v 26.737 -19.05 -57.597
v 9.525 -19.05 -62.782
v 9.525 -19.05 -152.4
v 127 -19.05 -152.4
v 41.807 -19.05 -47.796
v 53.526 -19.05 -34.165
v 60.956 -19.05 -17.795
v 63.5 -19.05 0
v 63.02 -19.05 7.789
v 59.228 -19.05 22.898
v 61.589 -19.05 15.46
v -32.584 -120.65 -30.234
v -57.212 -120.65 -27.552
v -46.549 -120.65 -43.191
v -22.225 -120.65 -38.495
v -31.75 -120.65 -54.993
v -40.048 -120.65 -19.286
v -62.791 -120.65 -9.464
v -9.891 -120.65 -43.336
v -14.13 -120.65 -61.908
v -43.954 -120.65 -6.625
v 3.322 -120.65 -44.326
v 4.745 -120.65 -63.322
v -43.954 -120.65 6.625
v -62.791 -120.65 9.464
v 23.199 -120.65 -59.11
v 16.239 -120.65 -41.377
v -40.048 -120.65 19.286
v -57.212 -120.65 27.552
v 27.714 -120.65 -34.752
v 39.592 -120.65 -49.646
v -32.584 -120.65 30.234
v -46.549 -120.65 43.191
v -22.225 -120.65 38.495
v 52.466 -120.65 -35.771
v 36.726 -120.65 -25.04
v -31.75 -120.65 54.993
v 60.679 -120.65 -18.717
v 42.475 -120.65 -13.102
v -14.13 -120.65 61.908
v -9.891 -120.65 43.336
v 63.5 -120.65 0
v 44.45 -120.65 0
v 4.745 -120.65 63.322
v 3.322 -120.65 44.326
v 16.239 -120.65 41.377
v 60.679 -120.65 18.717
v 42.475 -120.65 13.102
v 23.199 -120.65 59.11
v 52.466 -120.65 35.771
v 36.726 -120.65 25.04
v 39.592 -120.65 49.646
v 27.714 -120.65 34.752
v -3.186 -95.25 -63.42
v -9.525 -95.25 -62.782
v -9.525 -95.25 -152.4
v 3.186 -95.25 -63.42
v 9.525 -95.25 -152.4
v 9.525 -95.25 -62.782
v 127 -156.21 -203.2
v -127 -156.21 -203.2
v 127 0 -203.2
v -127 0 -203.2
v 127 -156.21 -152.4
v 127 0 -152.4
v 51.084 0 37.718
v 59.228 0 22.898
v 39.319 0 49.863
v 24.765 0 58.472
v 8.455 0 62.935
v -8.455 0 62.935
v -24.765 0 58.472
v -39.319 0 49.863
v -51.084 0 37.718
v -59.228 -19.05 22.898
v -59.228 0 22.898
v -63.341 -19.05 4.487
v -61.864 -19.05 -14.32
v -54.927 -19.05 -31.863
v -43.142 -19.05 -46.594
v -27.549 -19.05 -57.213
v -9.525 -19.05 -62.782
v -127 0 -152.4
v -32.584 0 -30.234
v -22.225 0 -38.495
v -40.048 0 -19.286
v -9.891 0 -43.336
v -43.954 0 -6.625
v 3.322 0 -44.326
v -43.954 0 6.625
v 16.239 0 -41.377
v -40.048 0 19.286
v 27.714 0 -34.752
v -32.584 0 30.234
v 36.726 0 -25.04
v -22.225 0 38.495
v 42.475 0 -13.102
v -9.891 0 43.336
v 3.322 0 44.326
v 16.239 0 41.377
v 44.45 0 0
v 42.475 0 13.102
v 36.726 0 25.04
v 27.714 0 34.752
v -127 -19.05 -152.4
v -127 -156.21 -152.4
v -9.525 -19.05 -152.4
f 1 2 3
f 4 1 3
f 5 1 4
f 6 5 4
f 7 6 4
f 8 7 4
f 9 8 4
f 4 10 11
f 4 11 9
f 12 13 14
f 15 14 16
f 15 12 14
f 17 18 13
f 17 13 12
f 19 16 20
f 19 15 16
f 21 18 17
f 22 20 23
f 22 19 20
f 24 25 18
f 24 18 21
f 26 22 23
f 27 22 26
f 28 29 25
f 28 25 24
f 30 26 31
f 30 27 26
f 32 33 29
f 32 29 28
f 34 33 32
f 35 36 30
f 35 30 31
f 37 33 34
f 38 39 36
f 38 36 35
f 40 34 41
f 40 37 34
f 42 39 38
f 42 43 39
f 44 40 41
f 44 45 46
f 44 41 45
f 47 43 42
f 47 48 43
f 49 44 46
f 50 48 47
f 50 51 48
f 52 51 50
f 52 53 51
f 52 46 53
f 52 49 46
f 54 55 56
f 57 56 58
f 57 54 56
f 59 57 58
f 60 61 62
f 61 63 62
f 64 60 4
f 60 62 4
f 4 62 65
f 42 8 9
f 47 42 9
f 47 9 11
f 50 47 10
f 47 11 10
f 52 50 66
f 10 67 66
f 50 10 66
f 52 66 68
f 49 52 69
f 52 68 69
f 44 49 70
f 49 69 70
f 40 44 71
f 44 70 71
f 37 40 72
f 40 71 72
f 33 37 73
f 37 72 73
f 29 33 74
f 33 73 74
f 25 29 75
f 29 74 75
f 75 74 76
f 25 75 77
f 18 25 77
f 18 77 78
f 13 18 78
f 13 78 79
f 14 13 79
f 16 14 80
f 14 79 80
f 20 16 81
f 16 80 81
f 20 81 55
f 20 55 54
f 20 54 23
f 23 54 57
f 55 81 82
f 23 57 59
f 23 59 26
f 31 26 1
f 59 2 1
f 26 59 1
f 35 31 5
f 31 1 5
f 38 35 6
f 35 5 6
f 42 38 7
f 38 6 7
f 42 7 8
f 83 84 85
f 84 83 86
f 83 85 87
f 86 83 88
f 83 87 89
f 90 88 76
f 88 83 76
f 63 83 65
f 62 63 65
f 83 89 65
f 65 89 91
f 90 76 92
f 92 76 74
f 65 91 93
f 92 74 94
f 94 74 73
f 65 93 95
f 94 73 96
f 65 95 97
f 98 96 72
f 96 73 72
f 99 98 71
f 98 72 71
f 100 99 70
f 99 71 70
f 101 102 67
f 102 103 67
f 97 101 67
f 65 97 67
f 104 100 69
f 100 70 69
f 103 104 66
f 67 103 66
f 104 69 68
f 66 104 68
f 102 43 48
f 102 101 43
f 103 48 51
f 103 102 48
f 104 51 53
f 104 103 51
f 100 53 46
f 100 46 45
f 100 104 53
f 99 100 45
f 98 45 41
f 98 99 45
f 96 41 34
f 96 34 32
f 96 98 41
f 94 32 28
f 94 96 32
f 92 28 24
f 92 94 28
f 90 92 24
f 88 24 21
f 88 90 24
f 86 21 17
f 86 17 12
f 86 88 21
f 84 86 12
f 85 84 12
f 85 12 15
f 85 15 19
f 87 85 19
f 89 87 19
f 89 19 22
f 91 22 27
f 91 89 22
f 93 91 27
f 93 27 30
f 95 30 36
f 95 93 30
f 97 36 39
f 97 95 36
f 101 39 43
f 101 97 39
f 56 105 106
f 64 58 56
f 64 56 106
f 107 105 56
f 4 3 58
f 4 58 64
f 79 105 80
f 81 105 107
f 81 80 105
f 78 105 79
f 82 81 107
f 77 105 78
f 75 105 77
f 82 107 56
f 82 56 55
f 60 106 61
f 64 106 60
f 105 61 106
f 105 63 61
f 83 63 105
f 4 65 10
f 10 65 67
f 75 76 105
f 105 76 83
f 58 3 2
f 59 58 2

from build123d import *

# Parameters (mm, degrees)
F0_R     = 44.45
F1_DEPTH = 19.05
F2_W     = 254
F2_H     = 50.8
F3_DEPTH = 137.16
F4_R     = 63.5
F4_R_2   = 44.45
F5_DEPTH = 101.6
F6_W     = 19.05
F6_H     = 89.6184392118
F7_DEPTH = 76.2


with BuildPart() as f1:
    # F0 (on Front) → F1 (new body)
    with BuildSketch(Plane.XZ):
        with BuildLine():
            ThreePointArc((-59.2277468166, 22.8981223472), (-11.6466320699, -62.4228000127), (63.5, 0))
            ThreePointArc((63.5, 0), (62.4228000127, 11.6466320699), (59.2277468166, 22.8981223472))
            ThreePointArc((59.2277468166, 22.8981223472), (0, 63.5), (-59.2277468166, 22.8981223472))
        make_face()
        Circle(F0_R, mode=Mode.SUBTRACT)
        with BuildLine():
            ThreePointArc((59.2277468166, 22.8981223472), (62.4228000127, 11.6466320699), (63.5, 0))
            ThreePointArc((63.5, 0), (-11.6466320699, -62.4228000127), (-59.2277468166, 22.8981223472))
            Line((-59.2277468166, 22.8981223472), (-127, -152.4))
            Line((-127, -152.4), (-127, -203.2))
            Line((-127, -203.2), (127, -203.2))
            Line((127, -203.2), (127, -152.4))
            Line((127, -152.4), (59.2277468166, 22.8981223472))
        make_face()
    extrude(amount=F1_DEPTH)

    # F2 (on face) → F3 (join)
    with BuildSketch(Plane.XZ.offset(19.05)):
        with Locations((0, -177.8)):
            Rectangle(F2_W, F2_H)
    extrude(amount=F3_DEPTH)

    # F4 (on face) → F5 (join)
    with BuildSketch(Plane.XZ.offset(19.05)):
        Circle(F4_R)
        Circle(F4_R_2, mode=Mode.SUBTRACT)
    extrude(amount=F5_DEPTH)

    # F6 (on face) → F7 (join)
    with BuildSketch(Plane.XZ.offset(19.05)):
        with Locations((0, -107.5907803941)):
            Rectangle(F6_W, F6_H)
    extrude(amount=F7_DEPTH)


solid = f1.part
